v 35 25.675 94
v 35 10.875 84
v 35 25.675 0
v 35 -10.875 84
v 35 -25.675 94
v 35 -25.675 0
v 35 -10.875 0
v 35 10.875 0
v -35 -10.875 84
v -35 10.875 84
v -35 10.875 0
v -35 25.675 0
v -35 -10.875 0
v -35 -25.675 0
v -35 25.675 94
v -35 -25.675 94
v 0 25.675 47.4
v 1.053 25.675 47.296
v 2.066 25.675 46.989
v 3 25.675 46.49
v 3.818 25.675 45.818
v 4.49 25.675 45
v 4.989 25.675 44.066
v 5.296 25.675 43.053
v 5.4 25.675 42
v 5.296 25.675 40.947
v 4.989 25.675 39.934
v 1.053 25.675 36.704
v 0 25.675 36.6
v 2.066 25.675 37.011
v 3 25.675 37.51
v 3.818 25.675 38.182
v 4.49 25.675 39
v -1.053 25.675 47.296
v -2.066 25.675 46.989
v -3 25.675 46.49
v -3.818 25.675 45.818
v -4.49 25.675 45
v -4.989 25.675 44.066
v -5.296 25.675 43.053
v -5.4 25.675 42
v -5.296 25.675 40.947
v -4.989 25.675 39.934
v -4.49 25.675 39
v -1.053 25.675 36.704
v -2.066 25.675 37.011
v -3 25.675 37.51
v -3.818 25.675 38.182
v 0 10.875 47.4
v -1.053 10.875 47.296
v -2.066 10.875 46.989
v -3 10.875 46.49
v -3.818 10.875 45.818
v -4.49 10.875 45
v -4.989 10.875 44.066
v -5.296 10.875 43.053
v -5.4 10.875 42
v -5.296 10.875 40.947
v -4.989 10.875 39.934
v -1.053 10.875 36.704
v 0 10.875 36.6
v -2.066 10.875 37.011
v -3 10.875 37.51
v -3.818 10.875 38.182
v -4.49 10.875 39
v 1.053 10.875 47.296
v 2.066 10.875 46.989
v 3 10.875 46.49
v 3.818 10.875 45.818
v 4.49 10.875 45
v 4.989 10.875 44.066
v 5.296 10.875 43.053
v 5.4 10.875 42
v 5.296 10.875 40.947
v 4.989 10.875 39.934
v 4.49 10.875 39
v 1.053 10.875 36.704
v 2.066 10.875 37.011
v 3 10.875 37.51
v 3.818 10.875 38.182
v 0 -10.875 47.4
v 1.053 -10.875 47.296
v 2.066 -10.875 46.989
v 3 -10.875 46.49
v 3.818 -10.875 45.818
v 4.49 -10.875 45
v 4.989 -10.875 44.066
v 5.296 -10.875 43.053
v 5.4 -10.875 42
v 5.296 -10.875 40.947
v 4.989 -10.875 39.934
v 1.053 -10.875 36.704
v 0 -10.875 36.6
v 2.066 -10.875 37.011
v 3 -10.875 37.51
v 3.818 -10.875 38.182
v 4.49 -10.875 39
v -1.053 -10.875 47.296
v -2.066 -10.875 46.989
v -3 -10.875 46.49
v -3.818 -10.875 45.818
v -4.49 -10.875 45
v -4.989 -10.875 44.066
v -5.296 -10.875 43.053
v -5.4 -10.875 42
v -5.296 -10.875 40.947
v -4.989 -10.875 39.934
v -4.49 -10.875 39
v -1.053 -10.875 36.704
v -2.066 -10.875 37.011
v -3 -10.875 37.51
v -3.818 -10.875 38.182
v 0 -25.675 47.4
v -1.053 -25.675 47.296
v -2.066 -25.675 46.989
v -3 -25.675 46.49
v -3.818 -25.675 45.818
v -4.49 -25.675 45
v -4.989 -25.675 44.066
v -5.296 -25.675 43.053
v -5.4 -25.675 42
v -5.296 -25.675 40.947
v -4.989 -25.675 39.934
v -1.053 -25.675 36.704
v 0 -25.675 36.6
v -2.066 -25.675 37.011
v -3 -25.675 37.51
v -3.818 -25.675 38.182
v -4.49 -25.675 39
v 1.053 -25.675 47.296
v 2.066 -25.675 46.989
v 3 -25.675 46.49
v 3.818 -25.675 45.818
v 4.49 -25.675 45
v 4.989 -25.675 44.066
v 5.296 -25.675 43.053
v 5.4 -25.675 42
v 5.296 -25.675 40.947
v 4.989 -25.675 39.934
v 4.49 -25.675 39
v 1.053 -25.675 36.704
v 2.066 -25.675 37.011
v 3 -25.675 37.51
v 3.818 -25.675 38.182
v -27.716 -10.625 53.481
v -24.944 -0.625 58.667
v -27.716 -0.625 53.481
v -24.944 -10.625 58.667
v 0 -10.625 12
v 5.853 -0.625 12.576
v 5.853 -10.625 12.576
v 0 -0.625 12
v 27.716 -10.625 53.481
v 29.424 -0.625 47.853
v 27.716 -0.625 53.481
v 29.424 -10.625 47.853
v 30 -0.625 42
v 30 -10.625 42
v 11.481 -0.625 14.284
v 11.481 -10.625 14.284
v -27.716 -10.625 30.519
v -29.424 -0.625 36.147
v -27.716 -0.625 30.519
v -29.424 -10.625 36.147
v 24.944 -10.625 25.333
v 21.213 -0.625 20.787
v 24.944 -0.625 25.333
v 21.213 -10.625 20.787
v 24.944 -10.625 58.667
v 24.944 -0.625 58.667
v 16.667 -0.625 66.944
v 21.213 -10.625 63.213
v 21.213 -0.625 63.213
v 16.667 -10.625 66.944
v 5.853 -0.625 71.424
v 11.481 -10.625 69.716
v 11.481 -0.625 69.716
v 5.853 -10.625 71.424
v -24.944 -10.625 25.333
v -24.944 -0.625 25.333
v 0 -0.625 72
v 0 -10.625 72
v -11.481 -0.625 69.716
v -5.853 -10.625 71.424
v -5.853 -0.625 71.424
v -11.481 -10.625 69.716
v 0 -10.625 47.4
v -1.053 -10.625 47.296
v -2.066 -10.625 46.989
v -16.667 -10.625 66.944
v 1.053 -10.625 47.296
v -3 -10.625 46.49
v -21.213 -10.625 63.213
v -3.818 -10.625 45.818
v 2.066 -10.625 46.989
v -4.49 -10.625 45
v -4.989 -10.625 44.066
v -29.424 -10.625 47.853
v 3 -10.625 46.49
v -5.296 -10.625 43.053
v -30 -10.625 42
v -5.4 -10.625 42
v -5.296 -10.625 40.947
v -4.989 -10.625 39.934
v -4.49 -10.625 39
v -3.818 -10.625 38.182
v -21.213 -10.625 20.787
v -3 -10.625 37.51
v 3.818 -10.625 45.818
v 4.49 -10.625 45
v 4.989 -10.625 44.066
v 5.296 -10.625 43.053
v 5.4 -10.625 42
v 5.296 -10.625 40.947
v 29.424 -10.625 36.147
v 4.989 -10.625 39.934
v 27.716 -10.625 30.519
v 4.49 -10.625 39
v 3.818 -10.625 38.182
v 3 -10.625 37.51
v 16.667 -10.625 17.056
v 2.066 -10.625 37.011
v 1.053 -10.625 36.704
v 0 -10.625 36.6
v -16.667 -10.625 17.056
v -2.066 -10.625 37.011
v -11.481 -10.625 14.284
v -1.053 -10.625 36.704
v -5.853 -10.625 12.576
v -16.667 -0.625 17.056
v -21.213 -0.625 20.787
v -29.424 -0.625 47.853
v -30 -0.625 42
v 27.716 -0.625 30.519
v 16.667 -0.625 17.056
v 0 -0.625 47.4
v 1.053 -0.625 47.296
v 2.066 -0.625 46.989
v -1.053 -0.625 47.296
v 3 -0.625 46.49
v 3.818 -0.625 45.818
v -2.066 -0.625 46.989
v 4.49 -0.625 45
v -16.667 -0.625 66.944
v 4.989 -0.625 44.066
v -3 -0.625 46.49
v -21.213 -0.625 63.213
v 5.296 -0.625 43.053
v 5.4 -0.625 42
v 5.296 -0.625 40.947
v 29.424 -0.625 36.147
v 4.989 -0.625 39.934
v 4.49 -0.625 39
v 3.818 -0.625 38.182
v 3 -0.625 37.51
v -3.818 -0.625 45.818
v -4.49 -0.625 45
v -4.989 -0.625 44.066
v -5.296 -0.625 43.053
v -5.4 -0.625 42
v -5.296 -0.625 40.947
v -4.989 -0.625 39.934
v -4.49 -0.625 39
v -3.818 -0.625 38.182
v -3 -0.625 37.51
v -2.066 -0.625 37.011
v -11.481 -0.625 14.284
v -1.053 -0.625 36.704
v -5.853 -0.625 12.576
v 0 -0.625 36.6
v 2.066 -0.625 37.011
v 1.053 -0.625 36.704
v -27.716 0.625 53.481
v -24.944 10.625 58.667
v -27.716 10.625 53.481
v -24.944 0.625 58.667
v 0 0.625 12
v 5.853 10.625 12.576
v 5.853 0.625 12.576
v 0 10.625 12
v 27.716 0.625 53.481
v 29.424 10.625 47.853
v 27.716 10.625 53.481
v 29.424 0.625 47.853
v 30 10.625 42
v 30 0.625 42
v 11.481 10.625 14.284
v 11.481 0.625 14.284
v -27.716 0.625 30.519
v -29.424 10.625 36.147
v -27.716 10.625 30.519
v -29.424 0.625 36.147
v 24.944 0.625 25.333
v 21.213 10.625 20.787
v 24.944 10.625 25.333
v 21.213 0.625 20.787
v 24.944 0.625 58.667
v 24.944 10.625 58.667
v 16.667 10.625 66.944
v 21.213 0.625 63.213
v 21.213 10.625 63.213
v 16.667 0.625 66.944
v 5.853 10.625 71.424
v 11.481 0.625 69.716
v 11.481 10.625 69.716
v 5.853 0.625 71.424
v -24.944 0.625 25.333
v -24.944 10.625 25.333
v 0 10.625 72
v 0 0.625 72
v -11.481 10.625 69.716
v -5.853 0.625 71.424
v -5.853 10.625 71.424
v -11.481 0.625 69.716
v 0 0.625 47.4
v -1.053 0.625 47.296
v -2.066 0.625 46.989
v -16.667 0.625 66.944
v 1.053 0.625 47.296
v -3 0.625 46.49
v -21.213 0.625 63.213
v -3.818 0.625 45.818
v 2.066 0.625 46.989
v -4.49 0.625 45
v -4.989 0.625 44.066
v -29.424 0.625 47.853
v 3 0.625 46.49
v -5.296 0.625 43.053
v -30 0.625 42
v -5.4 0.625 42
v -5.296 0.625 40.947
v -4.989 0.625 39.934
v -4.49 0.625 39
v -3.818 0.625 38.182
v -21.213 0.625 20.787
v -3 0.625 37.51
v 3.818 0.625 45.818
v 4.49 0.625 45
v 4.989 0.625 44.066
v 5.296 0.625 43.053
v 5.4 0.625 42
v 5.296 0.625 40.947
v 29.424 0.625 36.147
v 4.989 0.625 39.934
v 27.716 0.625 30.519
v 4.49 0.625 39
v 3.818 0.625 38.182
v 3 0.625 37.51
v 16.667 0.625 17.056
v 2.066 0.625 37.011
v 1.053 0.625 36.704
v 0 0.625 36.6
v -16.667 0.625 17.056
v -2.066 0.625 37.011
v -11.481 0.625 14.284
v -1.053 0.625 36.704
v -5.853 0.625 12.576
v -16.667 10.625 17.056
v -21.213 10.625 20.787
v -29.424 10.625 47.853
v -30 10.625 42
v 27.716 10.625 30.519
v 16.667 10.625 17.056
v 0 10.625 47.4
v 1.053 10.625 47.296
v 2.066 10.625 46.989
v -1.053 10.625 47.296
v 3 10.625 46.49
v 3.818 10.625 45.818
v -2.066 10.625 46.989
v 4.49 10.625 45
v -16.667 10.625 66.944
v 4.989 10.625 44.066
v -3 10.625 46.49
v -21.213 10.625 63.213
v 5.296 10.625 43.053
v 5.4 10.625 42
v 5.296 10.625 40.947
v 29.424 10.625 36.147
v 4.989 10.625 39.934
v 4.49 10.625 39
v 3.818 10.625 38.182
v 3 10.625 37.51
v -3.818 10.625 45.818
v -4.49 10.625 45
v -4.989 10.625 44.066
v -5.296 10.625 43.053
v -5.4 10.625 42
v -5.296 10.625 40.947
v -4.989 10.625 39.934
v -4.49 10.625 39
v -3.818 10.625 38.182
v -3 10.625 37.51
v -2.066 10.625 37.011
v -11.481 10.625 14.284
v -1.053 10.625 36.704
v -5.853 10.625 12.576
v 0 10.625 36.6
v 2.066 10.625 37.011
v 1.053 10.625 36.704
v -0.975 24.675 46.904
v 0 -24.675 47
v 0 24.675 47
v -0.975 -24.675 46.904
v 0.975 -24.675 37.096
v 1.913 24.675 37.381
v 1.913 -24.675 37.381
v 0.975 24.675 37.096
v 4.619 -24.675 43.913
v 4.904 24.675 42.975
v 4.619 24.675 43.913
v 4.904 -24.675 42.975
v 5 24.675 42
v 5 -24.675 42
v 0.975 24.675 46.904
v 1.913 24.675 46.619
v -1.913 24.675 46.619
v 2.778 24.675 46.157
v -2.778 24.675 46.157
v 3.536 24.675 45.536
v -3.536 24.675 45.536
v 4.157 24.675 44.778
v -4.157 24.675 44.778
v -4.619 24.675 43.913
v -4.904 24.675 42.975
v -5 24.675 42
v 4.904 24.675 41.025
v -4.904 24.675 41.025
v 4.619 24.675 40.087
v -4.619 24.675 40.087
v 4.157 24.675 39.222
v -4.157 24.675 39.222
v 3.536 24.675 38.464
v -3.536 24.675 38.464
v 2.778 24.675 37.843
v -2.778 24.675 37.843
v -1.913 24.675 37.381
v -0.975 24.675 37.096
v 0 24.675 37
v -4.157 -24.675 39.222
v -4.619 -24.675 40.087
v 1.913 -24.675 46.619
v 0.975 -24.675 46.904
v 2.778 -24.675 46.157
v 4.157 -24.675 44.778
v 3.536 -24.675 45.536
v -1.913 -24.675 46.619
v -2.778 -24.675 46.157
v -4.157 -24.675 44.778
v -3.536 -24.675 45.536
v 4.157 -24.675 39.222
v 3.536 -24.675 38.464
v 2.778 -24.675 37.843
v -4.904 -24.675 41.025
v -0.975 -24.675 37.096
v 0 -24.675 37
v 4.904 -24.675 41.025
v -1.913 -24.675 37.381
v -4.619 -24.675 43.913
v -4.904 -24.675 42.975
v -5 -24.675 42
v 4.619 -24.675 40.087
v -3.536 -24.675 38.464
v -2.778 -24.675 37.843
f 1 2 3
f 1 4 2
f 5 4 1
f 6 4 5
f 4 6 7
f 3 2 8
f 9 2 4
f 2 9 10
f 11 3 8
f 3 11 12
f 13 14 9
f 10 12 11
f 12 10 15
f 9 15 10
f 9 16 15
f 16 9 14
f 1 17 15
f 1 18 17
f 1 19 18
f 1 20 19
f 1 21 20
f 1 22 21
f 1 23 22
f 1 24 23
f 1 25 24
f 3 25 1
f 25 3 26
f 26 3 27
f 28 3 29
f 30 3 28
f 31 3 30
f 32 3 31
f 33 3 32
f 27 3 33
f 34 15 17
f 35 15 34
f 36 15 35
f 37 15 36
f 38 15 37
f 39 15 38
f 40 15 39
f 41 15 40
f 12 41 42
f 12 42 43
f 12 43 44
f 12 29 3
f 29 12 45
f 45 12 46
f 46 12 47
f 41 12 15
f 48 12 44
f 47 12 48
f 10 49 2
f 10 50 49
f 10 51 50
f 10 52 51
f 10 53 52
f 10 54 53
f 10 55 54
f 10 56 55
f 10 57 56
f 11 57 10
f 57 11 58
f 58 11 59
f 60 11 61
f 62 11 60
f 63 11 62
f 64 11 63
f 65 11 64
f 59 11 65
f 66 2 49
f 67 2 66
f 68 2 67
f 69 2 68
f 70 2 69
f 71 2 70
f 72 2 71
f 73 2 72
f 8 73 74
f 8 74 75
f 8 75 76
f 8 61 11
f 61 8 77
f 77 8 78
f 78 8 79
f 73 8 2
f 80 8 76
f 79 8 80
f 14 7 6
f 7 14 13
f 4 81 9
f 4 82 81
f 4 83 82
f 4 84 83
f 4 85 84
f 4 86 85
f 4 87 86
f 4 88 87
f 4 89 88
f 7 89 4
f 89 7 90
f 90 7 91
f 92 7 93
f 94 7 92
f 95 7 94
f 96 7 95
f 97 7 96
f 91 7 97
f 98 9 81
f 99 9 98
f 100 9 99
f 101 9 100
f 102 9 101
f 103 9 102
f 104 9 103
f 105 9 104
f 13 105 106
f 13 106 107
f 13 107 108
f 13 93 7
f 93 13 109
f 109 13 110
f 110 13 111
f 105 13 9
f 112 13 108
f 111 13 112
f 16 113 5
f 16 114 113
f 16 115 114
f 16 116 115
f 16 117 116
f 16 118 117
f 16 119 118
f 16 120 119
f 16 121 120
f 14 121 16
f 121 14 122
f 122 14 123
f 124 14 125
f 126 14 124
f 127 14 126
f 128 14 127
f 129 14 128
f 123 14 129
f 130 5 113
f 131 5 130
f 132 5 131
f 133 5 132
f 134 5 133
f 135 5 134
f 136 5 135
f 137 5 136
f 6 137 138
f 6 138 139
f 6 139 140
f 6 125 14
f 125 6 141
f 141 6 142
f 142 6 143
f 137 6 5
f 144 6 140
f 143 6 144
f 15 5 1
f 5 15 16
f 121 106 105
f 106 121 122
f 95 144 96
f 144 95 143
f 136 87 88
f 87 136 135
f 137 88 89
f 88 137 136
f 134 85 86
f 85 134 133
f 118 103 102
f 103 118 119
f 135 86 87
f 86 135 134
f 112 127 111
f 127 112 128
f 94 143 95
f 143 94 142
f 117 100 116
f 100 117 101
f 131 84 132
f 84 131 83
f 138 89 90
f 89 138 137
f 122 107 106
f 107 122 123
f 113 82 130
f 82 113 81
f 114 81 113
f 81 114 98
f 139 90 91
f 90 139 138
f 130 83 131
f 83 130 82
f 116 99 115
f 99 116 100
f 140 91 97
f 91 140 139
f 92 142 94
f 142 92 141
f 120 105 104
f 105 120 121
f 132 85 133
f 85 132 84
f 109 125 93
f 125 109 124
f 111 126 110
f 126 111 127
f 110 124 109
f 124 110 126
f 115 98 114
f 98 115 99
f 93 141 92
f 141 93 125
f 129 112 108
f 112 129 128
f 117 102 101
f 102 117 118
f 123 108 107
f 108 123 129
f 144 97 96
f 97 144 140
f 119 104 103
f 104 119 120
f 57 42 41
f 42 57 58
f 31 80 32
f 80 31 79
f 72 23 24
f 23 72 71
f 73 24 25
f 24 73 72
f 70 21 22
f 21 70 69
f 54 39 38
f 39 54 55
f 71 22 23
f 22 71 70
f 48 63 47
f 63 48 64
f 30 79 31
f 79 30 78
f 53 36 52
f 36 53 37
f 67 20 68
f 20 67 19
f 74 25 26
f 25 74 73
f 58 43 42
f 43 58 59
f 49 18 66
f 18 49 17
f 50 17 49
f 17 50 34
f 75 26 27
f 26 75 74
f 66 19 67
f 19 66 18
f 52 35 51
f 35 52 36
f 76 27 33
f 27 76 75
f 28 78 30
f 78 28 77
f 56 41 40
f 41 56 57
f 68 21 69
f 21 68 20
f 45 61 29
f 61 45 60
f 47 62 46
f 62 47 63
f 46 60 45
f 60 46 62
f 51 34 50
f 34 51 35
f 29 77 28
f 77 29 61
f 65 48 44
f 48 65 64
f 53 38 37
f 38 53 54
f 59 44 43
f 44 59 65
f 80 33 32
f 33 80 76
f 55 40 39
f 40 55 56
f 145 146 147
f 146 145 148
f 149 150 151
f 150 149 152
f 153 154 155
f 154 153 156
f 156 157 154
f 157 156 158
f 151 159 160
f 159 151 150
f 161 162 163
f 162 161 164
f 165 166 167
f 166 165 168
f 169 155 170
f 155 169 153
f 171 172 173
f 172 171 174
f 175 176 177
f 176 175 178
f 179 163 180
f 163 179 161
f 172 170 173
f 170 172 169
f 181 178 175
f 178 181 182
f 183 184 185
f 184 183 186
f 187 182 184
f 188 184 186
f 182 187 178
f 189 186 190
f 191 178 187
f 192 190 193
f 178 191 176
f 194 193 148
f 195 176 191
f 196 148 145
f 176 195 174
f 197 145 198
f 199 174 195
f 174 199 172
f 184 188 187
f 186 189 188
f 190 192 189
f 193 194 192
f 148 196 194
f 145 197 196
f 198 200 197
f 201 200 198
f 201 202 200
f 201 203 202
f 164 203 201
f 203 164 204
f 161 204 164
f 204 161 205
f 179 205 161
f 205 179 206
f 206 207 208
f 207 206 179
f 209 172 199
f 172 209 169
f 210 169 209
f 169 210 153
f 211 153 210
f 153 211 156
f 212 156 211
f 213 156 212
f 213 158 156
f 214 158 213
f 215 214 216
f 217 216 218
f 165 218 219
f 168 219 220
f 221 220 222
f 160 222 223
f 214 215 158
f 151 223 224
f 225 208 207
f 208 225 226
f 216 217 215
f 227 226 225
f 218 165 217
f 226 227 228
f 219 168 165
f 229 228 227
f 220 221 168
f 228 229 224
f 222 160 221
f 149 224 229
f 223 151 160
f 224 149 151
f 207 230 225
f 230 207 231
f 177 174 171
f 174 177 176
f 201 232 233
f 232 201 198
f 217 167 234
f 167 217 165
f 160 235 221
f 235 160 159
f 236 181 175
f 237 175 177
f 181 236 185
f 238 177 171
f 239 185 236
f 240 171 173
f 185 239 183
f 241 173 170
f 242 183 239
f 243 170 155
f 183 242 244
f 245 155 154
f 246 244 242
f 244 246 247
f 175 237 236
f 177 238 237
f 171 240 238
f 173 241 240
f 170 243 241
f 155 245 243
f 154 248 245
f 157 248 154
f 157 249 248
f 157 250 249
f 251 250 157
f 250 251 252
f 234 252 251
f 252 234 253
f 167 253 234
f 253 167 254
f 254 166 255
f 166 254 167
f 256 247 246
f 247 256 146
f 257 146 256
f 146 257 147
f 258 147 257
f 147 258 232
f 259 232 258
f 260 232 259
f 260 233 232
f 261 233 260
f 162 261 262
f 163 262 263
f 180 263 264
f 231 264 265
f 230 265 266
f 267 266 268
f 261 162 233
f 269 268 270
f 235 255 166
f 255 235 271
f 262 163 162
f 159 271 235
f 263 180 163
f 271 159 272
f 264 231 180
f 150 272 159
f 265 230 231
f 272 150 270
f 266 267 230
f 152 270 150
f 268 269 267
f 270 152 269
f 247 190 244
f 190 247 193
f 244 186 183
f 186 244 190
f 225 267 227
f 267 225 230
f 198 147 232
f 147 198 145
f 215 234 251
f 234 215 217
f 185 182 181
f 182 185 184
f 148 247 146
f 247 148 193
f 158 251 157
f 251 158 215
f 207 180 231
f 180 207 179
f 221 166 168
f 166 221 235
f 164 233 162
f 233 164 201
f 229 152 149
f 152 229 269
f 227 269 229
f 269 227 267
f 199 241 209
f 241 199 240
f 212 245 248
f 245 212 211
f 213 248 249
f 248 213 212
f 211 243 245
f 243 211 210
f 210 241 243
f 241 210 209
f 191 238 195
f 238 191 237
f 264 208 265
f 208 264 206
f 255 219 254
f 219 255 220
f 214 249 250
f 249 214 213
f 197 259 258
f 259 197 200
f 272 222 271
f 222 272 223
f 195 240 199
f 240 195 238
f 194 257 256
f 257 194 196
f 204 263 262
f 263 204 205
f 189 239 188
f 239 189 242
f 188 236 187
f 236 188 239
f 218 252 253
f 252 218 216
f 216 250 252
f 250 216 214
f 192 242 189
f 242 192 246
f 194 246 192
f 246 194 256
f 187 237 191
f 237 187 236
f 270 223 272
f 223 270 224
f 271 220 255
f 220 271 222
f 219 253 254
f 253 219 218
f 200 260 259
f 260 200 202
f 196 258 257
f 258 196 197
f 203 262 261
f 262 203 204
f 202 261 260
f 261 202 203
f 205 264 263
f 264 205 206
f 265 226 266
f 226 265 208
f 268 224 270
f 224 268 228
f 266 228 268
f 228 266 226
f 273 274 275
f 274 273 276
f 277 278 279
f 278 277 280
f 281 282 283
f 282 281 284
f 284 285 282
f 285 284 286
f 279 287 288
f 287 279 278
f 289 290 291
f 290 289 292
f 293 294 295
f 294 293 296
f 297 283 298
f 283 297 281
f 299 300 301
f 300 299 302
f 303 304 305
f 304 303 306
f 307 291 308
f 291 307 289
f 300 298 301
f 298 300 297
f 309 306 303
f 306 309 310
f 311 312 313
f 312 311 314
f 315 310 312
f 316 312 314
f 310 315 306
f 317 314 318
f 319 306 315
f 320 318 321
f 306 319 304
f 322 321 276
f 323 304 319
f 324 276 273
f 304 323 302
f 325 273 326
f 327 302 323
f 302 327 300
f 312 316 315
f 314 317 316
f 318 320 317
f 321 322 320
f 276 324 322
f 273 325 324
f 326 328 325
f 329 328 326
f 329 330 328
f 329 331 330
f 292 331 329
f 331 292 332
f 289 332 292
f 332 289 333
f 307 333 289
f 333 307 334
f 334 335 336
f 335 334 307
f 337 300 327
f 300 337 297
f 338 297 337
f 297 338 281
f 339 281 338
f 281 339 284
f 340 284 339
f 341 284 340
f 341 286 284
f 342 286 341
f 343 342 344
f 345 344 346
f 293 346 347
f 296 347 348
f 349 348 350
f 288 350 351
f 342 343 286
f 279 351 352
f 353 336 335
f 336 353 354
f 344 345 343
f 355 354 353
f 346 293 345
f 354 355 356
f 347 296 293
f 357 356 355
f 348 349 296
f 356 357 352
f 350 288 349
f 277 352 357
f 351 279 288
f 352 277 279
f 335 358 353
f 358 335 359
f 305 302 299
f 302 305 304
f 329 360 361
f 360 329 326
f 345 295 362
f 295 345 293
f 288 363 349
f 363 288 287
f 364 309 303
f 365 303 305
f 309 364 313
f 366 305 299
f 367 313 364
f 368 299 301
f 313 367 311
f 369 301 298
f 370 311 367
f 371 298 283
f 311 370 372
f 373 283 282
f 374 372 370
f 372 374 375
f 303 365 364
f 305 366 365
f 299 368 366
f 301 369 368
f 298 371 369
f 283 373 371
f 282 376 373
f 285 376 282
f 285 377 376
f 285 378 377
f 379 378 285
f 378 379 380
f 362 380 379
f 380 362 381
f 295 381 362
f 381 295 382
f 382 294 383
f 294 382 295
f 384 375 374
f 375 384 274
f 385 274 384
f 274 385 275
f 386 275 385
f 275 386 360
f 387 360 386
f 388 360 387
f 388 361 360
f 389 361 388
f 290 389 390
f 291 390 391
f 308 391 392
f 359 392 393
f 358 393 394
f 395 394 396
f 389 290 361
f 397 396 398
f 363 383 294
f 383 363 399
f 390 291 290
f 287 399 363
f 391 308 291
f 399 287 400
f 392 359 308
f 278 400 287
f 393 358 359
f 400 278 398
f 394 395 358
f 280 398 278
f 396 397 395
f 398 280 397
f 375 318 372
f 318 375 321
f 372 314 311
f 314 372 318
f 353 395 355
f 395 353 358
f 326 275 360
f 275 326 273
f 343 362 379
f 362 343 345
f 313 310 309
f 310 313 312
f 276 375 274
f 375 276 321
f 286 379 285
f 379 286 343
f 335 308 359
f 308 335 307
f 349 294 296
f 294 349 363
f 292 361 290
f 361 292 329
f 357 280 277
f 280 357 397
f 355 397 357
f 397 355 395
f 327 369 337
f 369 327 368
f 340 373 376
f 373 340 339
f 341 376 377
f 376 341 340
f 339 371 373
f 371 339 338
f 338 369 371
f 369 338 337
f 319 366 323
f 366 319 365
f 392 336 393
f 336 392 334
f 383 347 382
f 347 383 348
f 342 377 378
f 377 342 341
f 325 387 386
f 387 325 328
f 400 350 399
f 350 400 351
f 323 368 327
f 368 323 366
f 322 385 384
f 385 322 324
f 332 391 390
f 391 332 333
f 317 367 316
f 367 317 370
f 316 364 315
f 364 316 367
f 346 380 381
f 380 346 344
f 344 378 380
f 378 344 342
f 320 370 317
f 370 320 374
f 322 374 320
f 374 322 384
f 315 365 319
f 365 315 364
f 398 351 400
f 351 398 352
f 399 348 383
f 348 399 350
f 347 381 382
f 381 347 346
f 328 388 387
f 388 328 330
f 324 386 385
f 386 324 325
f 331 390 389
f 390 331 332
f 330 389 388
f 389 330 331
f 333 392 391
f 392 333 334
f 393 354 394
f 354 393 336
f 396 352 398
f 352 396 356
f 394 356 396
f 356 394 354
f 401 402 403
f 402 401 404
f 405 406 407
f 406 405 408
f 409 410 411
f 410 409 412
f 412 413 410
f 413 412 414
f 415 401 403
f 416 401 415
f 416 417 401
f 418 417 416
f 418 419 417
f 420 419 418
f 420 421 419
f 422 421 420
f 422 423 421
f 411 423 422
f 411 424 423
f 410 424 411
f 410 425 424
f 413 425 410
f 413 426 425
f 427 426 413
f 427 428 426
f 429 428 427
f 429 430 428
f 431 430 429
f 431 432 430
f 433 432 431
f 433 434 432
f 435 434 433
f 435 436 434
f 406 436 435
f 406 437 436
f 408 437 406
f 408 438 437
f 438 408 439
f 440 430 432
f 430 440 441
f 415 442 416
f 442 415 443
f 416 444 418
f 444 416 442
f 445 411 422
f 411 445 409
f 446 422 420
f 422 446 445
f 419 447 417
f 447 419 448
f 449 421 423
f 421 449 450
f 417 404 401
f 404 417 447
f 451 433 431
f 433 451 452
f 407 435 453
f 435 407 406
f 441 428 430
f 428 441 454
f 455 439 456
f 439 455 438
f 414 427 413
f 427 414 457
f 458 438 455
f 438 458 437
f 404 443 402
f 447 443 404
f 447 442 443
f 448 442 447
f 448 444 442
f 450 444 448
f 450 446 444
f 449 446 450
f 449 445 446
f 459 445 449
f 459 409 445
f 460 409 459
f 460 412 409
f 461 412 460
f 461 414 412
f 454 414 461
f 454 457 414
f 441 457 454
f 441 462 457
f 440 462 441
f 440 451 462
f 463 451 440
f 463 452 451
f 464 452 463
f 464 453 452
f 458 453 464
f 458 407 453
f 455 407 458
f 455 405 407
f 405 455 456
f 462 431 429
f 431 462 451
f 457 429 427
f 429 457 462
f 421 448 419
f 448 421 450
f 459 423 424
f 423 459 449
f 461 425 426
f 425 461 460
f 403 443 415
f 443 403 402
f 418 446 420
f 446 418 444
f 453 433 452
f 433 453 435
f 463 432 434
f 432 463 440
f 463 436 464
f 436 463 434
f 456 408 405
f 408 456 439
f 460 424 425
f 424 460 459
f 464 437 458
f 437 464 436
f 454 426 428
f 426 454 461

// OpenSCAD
$fn = 32;

// ------------------------------------------------------------------------
// Trolley wheel set: wheels d60, fork 84 mm tall
// Every part is its own module, assembly() places every instance.
// ------------------------------------------------------------------------

// --- part 1 ---
module trolley_fork() {
  difference() {
    union() {
      translate([-35, 10.875, 0]) cube([70, 14.8, 84]);
      translate([-35, -25.675, 0]) cube([70, 14.8, 84]);
      translate([-35, -25.675, 84]) cube([70, 51.35, 10]);
    }
    translate([0, -18.275, 42]) rotate([90, 0, 0]) cylinder(h = 16.8, d = 10.8, center = true);
    translate([0, 18.275, 42]) rotate([90, 0, 0]) cylinder(h = 16.8, d = 10.8, center = true);
  }
}

// --- part 2 ---
module trolley_wheel() {
  difference() {
      translate([0, 0, 0]) cylinder(h = 10, d = 60);
      translate([0, 0, -1]) cylinder(h = 12, d = 10.8);
    }
}

// --- part 3 ---
module trolley_axle() {
  translate([0, 0, -24.675]) cylinder(h = 49.35, d = 10);
}

// --- assembly ---
module assembly() {
  color([0.80, 0.24, 0.20]) translate([0, 0, 0]) rotate([0, 0, 0]) trolley_fork();
  color([0.20, 0.45, 0.75]) translate([0, -0.625, 42]) rotate([90, 0, 0]) trolley_wheel();
  color([0.25, 0.62, 0.32]) translate([0, 10.625, 42]) rotate([90, 0, 0]) trolley_wheel();
  color([0.92, 0.70, 0.18]) translate([0, 0, 42]) rotate([90, 0, 0]) trolley_axle();
}

assembly();
